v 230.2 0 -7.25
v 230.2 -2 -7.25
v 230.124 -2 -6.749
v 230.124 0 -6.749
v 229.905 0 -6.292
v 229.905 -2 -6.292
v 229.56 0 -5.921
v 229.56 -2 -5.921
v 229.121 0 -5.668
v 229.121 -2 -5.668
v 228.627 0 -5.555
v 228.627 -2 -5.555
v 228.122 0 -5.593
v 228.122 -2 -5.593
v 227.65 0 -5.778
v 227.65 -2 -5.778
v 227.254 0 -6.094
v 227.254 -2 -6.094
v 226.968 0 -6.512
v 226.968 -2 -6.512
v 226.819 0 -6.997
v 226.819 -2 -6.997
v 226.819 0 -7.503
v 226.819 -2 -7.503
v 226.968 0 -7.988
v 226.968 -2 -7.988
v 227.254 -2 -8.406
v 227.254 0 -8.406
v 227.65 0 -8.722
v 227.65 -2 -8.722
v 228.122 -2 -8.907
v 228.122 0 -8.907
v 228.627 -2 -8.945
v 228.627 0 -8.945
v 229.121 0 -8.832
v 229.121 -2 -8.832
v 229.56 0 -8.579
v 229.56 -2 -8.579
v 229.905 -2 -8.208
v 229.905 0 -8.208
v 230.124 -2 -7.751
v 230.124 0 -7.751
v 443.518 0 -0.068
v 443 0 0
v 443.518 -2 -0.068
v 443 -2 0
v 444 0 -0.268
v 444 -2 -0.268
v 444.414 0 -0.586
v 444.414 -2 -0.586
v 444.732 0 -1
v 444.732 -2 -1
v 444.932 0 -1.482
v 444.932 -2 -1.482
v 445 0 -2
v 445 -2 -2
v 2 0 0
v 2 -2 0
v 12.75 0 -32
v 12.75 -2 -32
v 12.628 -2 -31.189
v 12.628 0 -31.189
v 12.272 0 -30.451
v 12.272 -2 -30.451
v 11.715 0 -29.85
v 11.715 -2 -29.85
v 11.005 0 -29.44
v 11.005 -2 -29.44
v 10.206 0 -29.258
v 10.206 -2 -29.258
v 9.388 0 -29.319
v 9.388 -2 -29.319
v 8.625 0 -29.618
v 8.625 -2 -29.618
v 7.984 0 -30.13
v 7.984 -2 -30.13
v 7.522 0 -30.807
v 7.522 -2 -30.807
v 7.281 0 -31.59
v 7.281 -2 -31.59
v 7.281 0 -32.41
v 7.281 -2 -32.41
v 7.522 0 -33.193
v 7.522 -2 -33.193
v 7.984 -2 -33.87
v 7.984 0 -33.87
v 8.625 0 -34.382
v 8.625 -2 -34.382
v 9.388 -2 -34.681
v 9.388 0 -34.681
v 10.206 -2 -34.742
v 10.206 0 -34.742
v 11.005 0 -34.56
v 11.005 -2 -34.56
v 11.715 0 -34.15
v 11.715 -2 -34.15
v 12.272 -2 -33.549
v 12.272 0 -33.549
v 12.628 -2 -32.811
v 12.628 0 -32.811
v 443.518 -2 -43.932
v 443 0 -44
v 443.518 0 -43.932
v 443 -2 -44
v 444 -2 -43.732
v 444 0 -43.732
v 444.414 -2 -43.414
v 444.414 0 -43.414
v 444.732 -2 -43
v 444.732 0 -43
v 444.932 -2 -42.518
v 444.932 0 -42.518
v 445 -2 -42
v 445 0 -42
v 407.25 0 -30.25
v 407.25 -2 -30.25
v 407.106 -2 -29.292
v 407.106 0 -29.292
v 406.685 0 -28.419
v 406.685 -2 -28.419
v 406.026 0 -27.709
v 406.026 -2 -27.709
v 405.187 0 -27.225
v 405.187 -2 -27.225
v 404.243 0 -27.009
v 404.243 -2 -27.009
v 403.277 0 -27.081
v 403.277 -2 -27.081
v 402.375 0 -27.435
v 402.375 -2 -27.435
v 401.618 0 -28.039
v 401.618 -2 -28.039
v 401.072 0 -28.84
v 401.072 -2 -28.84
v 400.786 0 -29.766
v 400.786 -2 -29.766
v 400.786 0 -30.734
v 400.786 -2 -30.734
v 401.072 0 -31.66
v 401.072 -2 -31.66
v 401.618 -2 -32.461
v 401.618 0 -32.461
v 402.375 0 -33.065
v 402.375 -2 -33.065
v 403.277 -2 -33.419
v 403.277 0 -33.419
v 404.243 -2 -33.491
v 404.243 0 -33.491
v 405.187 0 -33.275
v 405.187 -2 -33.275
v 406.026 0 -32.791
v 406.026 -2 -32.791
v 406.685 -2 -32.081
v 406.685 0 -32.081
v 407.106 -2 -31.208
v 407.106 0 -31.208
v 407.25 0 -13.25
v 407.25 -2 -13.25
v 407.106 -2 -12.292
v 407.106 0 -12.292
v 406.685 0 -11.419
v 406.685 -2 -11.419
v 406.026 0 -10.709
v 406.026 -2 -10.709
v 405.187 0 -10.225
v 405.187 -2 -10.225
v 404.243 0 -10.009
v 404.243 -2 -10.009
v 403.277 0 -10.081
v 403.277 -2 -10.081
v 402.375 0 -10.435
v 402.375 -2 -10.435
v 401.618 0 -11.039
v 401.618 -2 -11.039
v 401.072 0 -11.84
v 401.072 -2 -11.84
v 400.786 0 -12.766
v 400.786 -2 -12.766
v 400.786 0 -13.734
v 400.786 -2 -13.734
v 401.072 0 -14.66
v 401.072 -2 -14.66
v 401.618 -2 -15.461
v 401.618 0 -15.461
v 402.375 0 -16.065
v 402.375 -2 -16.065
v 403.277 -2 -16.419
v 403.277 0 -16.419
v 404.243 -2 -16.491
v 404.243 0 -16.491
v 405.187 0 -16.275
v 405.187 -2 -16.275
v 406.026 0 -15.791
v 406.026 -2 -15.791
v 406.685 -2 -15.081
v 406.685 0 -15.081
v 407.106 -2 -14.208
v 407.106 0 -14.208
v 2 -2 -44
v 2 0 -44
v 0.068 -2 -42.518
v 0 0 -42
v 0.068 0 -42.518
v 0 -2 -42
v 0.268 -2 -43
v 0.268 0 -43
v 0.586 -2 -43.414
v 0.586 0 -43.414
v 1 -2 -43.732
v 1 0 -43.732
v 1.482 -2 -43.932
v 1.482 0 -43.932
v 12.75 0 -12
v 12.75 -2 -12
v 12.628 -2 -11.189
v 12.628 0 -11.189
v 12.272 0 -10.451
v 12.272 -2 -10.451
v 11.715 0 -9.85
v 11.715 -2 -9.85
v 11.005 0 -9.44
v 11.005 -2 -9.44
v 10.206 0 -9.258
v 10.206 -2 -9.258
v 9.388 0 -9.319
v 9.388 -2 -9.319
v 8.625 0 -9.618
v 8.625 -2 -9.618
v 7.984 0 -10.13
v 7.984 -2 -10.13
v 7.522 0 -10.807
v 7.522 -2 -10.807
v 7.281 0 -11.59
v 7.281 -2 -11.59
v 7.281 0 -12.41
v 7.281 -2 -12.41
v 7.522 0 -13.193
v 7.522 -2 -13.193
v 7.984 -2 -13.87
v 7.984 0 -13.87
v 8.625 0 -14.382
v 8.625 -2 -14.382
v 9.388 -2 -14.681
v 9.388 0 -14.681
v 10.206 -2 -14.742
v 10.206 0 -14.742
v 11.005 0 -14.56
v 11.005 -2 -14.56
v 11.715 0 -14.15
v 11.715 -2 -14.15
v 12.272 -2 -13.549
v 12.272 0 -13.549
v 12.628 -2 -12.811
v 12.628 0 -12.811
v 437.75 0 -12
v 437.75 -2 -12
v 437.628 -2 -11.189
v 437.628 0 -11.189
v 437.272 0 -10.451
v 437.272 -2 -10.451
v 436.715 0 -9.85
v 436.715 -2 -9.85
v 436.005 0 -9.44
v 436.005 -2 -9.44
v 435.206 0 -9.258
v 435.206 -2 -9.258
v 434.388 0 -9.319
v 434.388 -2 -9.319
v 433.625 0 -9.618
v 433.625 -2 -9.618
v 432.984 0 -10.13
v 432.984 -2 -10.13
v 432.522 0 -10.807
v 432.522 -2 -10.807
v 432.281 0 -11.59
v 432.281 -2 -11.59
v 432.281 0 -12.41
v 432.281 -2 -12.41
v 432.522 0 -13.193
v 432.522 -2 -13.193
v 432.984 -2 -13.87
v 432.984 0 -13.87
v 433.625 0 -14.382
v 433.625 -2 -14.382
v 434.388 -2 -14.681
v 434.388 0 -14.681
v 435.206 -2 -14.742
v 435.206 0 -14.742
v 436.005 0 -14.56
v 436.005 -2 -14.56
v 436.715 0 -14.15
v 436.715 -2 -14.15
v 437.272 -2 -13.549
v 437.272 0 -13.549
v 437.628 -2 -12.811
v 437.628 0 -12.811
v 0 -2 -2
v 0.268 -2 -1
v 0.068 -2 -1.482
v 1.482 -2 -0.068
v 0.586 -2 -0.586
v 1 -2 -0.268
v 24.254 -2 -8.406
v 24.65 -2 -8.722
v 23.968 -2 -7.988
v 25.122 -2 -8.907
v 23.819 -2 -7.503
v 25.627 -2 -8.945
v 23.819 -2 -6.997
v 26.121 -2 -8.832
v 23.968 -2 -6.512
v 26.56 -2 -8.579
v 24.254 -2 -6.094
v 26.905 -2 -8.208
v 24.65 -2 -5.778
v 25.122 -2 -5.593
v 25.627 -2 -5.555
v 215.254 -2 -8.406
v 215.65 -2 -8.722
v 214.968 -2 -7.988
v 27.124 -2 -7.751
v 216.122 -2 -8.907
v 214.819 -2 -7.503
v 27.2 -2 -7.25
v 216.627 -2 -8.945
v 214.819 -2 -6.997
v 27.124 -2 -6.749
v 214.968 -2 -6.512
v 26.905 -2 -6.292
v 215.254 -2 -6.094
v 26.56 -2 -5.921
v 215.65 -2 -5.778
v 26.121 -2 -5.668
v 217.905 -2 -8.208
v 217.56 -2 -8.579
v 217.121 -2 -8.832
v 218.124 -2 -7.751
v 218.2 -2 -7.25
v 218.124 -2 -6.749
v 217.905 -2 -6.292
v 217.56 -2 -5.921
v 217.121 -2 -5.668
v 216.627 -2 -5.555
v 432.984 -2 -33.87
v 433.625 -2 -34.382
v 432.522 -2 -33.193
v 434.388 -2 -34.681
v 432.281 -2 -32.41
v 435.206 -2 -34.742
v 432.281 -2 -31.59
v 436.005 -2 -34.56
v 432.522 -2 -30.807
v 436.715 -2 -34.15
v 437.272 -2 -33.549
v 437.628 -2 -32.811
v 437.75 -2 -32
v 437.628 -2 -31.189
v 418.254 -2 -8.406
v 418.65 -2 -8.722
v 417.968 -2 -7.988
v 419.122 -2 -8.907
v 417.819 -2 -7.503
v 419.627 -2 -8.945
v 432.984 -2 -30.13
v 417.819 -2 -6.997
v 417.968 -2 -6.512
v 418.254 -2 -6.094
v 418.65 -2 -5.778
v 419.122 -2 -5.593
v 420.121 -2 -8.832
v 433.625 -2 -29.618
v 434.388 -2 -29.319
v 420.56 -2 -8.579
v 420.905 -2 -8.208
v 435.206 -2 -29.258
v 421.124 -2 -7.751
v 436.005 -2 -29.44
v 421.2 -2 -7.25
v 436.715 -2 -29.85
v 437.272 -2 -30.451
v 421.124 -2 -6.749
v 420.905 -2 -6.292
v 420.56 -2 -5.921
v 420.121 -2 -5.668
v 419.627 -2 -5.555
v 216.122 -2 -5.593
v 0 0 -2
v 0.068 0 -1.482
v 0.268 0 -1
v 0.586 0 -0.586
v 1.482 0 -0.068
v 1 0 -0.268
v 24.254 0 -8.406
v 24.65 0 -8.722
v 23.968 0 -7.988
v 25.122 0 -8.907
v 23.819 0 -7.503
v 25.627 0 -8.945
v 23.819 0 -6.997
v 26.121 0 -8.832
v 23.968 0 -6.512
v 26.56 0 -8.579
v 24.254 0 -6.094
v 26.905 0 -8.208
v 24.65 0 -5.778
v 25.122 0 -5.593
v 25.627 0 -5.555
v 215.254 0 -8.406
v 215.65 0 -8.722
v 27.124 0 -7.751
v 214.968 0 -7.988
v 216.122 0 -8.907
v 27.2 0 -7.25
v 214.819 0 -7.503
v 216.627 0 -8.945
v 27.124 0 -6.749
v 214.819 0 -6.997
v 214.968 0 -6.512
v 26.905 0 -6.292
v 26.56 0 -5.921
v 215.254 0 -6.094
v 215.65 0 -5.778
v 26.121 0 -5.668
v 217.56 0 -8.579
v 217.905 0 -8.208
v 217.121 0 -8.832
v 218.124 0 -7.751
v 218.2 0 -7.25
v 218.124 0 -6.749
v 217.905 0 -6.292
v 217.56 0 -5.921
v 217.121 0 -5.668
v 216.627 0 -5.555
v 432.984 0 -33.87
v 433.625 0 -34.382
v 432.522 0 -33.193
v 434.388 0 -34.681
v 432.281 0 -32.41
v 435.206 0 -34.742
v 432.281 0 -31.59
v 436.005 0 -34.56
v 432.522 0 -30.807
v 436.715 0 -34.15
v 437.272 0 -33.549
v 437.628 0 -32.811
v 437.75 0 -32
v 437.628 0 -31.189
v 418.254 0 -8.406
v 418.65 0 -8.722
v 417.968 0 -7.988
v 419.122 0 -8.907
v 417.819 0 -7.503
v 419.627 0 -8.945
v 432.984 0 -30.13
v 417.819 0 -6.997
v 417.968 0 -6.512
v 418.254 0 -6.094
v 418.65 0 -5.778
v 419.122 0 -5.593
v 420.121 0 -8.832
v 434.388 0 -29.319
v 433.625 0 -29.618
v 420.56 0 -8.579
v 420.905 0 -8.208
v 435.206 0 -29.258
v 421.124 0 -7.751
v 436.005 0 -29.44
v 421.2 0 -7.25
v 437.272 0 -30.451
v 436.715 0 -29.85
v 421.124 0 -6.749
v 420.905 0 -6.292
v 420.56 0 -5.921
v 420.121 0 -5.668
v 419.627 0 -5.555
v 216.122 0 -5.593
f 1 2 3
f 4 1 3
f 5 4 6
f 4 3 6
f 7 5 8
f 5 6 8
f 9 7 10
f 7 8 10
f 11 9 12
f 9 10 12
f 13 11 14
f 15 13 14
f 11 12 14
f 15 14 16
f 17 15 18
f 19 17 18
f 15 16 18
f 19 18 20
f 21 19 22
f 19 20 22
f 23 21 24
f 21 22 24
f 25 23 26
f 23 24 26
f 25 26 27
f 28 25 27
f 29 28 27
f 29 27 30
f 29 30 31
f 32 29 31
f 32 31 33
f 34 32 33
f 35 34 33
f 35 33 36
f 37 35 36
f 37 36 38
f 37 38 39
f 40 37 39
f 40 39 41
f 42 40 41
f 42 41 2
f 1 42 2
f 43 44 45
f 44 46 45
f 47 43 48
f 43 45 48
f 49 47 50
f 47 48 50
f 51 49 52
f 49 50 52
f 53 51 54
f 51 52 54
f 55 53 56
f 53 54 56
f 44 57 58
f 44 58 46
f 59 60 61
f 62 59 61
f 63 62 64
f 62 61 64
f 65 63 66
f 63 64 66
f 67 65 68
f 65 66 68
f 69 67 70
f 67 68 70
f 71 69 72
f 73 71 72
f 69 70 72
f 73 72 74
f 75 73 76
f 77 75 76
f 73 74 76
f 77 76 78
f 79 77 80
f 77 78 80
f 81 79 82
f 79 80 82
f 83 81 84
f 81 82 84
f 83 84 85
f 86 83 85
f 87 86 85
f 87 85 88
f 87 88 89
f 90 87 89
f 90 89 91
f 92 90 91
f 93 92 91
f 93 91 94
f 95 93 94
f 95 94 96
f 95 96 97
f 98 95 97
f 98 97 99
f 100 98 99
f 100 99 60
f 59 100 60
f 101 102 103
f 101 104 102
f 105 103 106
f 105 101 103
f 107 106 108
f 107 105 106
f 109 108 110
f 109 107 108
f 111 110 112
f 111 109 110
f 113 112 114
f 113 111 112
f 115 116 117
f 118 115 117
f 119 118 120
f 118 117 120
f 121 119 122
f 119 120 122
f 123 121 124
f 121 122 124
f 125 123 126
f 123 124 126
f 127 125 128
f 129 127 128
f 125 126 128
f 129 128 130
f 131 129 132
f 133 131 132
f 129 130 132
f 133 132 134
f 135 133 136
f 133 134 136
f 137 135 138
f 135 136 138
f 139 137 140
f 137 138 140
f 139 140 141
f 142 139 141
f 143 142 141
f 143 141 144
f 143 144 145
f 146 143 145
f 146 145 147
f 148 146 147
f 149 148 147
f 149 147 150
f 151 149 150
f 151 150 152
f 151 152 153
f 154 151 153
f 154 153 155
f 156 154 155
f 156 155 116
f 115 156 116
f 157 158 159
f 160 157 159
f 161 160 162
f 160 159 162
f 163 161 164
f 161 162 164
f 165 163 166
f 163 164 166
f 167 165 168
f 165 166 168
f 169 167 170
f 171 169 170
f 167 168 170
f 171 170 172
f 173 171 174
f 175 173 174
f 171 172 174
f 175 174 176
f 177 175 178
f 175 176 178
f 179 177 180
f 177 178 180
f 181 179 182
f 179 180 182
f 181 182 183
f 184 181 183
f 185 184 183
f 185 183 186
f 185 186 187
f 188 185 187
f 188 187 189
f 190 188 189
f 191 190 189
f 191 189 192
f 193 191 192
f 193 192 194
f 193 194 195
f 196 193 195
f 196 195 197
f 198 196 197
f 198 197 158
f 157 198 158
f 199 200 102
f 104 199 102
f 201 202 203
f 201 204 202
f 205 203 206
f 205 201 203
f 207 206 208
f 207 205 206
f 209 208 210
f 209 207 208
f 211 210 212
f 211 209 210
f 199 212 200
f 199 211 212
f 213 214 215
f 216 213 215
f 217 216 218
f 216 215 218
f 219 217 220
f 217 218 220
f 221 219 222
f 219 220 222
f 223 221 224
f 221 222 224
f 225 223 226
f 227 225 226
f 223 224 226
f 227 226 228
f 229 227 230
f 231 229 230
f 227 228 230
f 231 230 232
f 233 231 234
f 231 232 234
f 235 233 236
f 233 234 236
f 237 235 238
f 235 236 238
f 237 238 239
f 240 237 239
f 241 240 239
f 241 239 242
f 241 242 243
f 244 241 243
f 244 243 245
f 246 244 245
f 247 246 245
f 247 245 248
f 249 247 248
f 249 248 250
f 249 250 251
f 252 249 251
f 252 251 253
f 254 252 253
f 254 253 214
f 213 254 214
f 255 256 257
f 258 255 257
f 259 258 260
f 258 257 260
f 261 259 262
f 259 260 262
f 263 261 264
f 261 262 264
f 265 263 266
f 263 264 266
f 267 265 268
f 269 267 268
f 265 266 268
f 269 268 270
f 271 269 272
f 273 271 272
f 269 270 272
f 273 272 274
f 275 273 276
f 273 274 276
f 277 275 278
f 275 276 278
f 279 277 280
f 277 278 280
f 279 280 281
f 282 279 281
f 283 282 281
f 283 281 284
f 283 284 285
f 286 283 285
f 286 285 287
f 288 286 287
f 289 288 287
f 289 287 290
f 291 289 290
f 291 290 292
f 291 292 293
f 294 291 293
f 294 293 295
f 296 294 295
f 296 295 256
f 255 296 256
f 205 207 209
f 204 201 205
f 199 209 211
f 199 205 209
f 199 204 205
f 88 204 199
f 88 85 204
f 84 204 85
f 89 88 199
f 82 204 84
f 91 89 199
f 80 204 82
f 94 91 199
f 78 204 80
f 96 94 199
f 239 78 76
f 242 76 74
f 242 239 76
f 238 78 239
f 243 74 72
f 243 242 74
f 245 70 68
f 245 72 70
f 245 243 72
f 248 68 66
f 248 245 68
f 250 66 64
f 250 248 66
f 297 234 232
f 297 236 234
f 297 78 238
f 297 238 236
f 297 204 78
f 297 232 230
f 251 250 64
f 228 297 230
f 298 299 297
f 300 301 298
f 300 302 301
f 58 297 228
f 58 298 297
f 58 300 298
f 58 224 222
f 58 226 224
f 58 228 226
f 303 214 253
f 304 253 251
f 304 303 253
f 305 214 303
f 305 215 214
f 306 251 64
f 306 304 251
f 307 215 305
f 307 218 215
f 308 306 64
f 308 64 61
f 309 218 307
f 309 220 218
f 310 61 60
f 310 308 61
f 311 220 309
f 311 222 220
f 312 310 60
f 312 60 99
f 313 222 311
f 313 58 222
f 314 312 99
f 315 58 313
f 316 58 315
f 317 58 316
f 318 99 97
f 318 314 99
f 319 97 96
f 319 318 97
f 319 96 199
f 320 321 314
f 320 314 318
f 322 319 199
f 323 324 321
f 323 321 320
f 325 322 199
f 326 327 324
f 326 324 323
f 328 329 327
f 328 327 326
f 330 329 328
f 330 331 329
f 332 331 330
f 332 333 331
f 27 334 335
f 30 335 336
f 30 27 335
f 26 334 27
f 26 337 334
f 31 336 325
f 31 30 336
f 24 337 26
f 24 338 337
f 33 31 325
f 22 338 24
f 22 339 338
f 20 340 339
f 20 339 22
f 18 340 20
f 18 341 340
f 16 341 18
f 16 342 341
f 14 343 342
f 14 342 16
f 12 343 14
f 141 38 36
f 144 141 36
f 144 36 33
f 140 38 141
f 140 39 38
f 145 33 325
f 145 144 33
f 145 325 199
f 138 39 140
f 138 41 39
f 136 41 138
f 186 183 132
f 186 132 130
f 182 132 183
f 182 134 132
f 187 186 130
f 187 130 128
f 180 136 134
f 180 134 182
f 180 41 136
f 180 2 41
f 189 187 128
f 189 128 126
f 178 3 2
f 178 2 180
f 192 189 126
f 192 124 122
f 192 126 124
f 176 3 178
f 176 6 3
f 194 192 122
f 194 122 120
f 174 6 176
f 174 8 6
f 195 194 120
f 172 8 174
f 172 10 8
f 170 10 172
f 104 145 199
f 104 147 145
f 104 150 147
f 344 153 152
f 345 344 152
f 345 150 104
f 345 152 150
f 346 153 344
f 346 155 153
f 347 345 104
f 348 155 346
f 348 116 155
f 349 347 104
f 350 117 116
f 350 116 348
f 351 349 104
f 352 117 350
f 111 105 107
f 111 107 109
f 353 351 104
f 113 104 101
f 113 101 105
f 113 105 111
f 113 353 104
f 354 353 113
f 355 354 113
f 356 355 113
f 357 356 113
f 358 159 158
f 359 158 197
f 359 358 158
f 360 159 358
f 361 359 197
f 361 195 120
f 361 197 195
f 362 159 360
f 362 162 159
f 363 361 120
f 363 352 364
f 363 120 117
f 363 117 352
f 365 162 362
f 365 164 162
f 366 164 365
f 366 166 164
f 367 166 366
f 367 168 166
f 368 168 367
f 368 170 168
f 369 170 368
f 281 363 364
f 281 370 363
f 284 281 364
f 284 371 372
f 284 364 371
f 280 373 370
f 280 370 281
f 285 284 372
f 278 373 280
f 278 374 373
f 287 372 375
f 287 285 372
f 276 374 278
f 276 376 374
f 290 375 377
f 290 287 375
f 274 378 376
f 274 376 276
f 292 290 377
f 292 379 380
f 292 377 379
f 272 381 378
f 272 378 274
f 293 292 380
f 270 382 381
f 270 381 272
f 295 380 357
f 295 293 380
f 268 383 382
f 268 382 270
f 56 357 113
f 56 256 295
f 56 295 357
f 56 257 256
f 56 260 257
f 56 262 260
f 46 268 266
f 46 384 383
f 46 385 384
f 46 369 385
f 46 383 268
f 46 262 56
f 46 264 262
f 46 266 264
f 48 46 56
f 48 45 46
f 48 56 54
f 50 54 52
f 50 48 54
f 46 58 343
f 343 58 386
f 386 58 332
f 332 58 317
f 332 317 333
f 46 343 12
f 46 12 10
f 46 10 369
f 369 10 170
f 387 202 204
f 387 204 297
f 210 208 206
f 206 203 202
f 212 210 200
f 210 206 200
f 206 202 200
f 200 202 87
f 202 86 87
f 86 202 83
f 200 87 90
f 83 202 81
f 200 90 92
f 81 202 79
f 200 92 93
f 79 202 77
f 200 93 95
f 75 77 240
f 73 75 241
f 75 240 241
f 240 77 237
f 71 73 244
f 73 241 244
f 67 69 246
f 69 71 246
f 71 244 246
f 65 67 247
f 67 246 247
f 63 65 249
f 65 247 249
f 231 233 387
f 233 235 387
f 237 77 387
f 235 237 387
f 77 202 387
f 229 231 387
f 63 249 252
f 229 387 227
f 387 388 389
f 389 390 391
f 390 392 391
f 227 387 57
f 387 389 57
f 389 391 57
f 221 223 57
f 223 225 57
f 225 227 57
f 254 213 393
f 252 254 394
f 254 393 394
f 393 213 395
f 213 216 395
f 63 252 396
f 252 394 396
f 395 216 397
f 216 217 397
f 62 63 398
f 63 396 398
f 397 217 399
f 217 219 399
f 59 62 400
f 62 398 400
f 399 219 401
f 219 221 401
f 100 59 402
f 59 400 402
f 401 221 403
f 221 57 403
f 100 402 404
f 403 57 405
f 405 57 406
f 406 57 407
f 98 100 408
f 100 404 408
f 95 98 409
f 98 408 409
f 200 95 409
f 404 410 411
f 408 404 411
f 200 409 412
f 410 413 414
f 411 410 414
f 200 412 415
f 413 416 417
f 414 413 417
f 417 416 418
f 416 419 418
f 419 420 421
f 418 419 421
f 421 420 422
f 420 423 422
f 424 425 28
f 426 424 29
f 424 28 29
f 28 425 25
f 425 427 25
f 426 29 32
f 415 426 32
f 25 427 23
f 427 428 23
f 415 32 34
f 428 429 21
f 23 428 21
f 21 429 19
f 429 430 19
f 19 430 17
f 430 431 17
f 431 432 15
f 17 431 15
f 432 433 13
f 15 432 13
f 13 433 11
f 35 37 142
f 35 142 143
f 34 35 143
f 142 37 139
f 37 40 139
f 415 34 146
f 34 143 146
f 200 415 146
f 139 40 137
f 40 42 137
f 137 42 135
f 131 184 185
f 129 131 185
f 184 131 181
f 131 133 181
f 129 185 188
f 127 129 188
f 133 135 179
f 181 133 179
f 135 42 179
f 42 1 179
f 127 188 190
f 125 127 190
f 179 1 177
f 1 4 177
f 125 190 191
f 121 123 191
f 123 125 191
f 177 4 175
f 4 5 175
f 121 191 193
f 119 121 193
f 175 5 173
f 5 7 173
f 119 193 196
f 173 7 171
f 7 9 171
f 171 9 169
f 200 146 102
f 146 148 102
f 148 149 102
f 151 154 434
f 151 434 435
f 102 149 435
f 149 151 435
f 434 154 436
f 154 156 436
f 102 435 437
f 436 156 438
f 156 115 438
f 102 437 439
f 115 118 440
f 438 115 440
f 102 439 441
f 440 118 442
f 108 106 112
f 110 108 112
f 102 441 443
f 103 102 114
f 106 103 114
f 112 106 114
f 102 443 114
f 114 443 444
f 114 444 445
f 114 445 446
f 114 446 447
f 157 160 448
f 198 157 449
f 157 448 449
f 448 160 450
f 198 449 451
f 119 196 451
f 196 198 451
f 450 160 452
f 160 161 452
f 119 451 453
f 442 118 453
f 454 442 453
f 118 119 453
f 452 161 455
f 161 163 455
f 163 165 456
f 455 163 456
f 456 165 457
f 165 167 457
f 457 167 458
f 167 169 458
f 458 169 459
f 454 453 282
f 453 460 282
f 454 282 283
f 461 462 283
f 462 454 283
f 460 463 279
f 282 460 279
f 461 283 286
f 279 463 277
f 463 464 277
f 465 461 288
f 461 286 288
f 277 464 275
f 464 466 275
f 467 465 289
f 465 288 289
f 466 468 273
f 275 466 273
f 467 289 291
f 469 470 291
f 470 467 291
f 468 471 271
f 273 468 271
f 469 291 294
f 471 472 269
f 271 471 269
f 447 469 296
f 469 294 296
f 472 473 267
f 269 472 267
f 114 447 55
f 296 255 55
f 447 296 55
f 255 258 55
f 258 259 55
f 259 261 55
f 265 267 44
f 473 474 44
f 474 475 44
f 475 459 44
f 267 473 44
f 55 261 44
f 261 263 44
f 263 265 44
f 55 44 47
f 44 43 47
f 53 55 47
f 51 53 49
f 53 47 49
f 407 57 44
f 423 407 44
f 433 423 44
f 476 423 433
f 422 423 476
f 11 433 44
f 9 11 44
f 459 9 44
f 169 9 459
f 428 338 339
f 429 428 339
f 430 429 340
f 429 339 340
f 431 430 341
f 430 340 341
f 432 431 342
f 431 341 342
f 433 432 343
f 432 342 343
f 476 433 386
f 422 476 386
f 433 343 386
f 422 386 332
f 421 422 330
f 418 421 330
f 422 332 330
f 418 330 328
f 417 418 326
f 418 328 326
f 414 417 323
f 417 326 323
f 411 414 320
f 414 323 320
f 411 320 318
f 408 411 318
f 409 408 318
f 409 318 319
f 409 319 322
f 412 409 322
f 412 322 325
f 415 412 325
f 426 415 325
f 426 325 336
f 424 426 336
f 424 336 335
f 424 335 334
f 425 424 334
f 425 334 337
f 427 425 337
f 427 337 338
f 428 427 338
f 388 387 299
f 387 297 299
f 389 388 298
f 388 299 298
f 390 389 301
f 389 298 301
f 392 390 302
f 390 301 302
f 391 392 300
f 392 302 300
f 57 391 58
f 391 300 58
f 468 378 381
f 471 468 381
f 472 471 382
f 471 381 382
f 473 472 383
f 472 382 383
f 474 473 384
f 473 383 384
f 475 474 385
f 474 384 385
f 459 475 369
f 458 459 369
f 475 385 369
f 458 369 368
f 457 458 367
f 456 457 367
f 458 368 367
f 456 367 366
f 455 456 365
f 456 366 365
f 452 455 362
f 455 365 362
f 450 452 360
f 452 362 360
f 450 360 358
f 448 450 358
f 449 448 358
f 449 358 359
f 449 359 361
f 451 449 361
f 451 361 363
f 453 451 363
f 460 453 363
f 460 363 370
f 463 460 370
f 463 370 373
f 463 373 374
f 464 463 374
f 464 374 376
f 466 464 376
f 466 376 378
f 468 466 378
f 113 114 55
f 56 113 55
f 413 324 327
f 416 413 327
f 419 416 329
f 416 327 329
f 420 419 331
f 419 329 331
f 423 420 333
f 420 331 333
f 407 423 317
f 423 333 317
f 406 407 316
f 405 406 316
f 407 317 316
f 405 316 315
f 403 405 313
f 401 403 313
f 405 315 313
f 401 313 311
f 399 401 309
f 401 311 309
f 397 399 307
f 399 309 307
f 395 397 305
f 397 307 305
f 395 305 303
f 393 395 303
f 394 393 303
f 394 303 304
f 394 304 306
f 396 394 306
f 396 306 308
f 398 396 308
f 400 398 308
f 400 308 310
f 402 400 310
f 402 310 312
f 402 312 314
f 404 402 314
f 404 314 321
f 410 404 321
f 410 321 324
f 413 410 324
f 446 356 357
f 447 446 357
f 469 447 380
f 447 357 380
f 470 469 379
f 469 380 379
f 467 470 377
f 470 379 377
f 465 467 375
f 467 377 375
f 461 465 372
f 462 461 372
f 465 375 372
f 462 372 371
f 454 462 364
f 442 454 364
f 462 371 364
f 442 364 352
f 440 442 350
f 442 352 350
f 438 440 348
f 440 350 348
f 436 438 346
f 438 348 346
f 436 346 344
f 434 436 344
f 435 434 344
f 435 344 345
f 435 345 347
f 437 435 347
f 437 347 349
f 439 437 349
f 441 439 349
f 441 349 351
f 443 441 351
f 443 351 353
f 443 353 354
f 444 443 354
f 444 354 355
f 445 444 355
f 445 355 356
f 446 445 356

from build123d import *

# Parameters (mm, degrees)
SKETCH_W      = 445
SKETCH_H      = 44
PAD_DEPTH     = 2
SKETCH001_R   = 2.75
HOLE_DEPTH    = 25
SKETCH002_R   = 1.7
HOLE001_DEPTH = 25
SKETCH003_R   = 3.25
POCKET_DEPTH  = 2.001
FILLET_R      = 2


with BuildPart() as part:
    # Sketch → Pad (new body)
    with BuildSketch(Plane.XZ):
        with Locations((222.5, -22)):
            Rectangle(SKETCH_W, SKETCH_H)
    extrude(amount=PAD_DEPTH)

    # Sketch001 (on Face6 of Pad) → Hole (cut)
    with BuildSketch(Plane.XZ.offset(2)):
        with Locations((10, -32)):
            Circle(SKETCH001_R)
        with Locations((10, -12)):
            Circle(SKETCH001_R)
        with Locations((435, -32)):
            Circle(SKETCH001_R)
        with Locations((435, -12)):
            Circle(SKETCH001_R)
    extrude(amount=-HOLE_DEPTH, mode=Mode.SUBTRACT)

    # Sketch002 (on Face5 of Hole) → Hole001 (cut)
    with BuildSketch(Plane.XZ.offset(2)):
        with Locations((419.5, -7.25)):
            Circle(SKETCH002_R)
        with Locations((228.5, -7.25)):
            Circle(SKETCH002_R)
        with Locations((25.5, -7.25)):
            Circle(SKETCH002_R)
        with Locations((216.5, -7.25)):
            Circle(SKETCH002_R)
    extrude(amount=-HOLE001_DEPTH, mode=Mode.SUBTRACT)

    # Sketch003 (on Face5 of Hole001) → Pocket (cut, through all)
    with BuildSketch(Plane.XZ.offset(2)):
        with Locations((404, -13.25)):
            Circle(SKETCH003_R)
        with Locations((404, -30.25)):
            Circle(SKETCH003_R)
    extrude(amount=-POCKET_DEPTH, mode=Mode.SUBTRACT)

    # Fillet
    fillet_edges = [part.edges().sort_by_distance(p)[0] for p in [
        (445, -1, 0),
        (445, -1, -44),
        (0, -1, -44),
        (0, -1, 0),
    ]]
    fillet(fillet_edges, radius=FILLET_R)


solid = part.part
